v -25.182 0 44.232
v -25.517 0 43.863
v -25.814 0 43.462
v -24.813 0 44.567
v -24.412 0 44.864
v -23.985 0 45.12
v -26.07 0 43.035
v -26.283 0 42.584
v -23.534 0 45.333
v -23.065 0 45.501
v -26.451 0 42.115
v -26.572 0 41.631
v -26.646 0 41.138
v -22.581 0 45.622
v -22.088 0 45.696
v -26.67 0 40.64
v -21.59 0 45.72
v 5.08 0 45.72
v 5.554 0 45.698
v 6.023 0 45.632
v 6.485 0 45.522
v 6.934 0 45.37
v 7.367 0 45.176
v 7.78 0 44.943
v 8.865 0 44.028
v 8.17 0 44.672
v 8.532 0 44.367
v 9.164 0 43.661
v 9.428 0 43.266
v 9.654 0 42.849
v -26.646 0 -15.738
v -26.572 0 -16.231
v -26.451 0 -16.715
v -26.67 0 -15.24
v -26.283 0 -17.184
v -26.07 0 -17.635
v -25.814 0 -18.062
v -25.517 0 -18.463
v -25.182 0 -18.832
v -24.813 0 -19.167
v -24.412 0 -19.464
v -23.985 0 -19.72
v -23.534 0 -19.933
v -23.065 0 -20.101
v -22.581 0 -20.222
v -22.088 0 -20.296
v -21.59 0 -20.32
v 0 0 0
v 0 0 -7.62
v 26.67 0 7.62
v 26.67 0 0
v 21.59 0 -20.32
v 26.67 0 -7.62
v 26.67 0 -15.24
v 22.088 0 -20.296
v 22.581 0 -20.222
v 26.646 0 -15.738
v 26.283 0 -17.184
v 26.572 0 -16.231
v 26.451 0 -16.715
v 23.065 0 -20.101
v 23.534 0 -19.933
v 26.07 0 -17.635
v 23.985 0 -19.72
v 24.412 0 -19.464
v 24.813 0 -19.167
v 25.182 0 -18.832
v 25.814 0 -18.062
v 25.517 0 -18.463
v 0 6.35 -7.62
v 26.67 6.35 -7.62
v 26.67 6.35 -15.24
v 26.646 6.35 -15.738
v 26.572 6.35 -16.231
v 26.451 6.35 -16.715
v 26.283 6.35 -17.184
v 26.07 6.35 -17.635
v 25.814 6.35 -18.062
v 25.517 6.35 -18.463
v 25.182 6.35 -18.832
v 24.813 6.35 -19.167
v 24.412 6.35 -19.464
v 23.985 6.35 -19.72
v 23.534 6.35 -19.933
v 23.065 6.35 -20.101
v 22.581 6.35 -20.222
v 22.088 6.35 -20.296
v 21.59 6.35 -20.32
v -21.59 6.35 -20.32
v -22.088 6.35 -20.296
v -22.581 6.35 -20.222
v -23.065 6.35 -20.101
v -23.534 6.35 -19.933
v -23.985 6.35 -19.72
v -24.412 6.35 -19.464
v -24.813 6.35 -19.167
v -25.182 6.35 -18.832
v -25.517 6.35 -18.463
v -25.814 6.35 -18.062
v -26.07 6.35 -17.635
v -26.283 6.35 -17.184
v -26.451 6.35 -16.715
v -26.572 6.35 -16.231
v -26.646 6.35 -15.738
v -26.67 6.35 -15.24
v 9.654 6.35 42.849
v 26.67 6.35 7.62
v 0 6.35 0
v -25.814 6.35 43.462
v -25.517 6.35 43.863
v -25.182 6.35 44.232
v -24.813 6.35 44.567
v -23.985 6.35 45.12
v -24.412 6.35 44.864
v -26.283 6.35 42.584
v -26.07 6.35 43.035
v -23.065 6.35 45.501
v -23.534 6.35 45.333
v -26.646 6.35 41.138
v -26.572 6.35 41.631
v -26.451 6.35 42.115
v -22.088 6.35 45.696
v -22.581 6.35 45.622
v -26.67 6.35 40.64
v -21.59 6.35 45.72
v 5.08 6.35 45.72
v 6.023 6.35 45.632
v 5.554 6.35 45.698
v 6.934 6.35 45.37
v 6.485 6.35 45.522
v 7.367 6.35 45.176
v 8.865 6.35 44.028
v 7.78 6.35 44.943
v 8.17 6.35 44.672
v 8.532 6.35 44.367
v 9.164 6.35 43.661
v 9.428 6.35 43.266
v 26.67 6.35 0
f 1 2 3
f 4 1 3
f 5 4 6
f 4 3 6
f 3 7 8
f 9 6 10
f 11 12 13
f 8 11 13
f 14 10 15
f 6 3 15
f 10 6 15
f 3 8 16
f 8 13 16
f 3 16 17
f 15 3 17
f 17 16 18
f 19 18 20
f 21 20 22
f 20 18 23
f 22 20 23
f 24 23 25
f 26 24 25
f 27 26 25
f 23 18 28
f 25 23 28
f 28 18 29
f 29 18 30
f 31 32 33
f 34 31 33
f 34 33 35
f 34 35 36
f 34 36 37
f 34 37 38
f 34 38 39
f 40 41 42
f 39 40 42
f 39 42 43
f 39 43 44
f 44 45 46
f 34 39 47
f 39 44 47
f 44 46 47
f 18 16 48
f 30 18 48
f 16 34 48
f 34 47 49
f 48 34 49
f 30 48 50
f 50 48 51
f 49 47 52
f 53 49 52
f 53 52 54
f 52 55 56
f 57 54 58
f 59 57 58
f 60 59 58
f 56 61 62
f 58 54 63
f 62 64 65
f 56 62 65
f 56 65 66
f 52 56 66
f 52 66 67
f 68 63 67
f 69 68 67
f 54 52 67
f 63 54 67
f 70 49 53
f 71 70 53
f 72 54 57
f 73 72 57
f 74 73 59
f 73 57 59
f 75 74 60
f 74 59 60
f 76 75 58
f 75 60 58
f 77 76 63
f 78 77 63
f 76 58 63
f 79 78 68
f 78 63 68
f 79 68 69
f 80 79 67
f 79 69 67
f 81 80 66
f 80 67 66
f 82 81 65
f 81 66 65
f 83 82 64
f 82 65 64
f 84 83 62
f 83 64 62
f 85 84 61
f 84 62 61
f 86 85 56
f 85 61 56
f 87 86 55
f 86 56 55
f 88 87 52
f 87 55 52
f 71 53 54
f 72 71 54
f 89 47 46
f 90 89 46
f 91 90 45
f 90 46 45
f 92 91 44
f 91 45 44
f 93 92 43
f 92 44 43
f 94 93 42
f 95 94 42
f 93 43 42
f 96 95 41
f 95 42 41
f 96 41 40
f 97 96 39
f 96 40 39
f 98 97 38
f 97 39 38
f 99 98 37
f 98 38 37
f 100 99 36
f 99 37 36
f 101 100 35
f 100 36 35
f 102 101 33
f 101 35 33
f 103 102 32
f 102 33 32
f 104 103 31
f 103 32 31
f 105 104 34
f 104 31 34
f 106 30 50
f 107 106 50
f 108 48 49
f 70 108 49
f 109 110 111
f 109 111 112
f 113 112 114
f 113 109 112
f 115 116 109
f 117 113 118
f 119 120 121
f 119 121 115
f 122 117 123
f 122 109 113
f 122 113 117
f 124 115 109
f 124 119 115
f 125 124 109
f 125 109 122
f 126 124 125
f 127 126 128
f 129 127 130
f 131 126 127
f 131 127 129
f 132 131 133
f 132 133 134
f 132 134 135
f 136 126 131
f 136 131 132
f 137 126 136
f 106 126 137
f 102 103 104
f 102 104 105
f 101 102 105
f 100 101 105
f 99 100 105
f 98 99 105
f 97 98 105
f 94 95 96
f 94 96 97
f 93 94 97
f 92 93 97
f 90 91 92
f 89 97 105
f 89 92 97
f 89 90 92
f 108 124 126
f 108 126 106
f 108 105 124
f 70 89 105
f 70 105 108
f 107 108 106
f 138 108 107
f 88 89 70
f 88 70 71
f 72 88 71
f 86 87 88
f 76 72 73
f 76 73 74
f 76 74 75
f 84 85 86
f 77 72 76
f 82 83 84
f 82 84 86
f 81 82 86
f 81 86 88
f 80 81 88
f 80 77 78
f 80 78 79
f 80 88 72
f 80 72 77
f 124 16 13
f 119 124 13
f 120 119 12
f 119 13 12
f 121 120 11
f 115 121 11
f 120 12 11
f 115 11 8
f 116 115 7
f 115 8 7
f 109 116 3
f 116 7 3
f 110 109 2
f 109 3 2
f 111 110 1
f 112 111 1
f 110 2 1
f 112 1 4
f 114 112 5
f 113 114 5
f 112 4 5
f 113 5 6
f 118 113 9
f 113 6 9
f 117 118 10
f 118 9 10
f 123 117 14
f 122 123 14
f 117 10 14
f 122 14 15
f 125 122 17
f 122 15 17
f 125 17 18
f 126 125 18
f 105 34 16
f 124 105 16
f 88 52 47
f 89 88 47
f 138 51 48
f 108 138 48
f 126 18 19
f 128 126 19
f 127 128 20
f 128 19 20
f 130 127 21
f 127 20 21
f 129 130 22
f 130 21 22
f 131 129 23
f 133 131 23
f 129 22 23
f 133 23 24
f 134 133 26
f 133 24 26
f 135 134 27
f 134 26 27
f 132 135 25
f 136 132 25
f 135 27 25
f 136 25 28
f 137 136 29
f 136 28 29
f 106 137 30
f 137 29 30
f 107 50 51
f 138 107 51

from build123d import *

# Parameters (mm, degrees)
BOSS_EXTRUDE1_DEPTH = 6.35


with BuildPart() as part:
    # Sketch1 → Boss-Extrude1 (new body)
    with BuildSketch(Plane(origin=(0, 0, 0), x_dir=(1, 0, 0), z_dir=(0, 1, 0))):
        with BuildLine():
            Line((26.67, 7.62), (26.67, 15.24))
            ThreePointArc((26.67, 15.24), (25.182102448, 18.832102448), (21.59, 20.32))
            Line((21.59, 20.32), (-21.59, 20.32))
            ThreePointArc((-21.59, 20.32), (-25.182102448, 18.832102448), (-26.67, 15.24))
            Line((-26.67, 15.24), (-26.67, -40.64))
            ThreePointArc((-26.67, -40.64), (-25.182102448, -44.232102448), (-21.59, -45.72))
            Line((-21.59, -45.72), (5.08, -45.72))
            ThreePointArc((5.08, -45.72), (7.780244368, -44.942915332), (9.654379091, -42.849401713))
            Line((9.654379091, -42.849401713), (26.67, -7.62))
            Line((26.67, -7.62), (26.67, 0))
            Line((26.67, 0), (0, 0))
            Line((0, 0), (0, 7.62))
            Line((0, 7.62), (26.67, 7.62))
        make_face()
    extrude(amount=BOSS_EXTRUDE1_DEPTH)


solid = part.part
